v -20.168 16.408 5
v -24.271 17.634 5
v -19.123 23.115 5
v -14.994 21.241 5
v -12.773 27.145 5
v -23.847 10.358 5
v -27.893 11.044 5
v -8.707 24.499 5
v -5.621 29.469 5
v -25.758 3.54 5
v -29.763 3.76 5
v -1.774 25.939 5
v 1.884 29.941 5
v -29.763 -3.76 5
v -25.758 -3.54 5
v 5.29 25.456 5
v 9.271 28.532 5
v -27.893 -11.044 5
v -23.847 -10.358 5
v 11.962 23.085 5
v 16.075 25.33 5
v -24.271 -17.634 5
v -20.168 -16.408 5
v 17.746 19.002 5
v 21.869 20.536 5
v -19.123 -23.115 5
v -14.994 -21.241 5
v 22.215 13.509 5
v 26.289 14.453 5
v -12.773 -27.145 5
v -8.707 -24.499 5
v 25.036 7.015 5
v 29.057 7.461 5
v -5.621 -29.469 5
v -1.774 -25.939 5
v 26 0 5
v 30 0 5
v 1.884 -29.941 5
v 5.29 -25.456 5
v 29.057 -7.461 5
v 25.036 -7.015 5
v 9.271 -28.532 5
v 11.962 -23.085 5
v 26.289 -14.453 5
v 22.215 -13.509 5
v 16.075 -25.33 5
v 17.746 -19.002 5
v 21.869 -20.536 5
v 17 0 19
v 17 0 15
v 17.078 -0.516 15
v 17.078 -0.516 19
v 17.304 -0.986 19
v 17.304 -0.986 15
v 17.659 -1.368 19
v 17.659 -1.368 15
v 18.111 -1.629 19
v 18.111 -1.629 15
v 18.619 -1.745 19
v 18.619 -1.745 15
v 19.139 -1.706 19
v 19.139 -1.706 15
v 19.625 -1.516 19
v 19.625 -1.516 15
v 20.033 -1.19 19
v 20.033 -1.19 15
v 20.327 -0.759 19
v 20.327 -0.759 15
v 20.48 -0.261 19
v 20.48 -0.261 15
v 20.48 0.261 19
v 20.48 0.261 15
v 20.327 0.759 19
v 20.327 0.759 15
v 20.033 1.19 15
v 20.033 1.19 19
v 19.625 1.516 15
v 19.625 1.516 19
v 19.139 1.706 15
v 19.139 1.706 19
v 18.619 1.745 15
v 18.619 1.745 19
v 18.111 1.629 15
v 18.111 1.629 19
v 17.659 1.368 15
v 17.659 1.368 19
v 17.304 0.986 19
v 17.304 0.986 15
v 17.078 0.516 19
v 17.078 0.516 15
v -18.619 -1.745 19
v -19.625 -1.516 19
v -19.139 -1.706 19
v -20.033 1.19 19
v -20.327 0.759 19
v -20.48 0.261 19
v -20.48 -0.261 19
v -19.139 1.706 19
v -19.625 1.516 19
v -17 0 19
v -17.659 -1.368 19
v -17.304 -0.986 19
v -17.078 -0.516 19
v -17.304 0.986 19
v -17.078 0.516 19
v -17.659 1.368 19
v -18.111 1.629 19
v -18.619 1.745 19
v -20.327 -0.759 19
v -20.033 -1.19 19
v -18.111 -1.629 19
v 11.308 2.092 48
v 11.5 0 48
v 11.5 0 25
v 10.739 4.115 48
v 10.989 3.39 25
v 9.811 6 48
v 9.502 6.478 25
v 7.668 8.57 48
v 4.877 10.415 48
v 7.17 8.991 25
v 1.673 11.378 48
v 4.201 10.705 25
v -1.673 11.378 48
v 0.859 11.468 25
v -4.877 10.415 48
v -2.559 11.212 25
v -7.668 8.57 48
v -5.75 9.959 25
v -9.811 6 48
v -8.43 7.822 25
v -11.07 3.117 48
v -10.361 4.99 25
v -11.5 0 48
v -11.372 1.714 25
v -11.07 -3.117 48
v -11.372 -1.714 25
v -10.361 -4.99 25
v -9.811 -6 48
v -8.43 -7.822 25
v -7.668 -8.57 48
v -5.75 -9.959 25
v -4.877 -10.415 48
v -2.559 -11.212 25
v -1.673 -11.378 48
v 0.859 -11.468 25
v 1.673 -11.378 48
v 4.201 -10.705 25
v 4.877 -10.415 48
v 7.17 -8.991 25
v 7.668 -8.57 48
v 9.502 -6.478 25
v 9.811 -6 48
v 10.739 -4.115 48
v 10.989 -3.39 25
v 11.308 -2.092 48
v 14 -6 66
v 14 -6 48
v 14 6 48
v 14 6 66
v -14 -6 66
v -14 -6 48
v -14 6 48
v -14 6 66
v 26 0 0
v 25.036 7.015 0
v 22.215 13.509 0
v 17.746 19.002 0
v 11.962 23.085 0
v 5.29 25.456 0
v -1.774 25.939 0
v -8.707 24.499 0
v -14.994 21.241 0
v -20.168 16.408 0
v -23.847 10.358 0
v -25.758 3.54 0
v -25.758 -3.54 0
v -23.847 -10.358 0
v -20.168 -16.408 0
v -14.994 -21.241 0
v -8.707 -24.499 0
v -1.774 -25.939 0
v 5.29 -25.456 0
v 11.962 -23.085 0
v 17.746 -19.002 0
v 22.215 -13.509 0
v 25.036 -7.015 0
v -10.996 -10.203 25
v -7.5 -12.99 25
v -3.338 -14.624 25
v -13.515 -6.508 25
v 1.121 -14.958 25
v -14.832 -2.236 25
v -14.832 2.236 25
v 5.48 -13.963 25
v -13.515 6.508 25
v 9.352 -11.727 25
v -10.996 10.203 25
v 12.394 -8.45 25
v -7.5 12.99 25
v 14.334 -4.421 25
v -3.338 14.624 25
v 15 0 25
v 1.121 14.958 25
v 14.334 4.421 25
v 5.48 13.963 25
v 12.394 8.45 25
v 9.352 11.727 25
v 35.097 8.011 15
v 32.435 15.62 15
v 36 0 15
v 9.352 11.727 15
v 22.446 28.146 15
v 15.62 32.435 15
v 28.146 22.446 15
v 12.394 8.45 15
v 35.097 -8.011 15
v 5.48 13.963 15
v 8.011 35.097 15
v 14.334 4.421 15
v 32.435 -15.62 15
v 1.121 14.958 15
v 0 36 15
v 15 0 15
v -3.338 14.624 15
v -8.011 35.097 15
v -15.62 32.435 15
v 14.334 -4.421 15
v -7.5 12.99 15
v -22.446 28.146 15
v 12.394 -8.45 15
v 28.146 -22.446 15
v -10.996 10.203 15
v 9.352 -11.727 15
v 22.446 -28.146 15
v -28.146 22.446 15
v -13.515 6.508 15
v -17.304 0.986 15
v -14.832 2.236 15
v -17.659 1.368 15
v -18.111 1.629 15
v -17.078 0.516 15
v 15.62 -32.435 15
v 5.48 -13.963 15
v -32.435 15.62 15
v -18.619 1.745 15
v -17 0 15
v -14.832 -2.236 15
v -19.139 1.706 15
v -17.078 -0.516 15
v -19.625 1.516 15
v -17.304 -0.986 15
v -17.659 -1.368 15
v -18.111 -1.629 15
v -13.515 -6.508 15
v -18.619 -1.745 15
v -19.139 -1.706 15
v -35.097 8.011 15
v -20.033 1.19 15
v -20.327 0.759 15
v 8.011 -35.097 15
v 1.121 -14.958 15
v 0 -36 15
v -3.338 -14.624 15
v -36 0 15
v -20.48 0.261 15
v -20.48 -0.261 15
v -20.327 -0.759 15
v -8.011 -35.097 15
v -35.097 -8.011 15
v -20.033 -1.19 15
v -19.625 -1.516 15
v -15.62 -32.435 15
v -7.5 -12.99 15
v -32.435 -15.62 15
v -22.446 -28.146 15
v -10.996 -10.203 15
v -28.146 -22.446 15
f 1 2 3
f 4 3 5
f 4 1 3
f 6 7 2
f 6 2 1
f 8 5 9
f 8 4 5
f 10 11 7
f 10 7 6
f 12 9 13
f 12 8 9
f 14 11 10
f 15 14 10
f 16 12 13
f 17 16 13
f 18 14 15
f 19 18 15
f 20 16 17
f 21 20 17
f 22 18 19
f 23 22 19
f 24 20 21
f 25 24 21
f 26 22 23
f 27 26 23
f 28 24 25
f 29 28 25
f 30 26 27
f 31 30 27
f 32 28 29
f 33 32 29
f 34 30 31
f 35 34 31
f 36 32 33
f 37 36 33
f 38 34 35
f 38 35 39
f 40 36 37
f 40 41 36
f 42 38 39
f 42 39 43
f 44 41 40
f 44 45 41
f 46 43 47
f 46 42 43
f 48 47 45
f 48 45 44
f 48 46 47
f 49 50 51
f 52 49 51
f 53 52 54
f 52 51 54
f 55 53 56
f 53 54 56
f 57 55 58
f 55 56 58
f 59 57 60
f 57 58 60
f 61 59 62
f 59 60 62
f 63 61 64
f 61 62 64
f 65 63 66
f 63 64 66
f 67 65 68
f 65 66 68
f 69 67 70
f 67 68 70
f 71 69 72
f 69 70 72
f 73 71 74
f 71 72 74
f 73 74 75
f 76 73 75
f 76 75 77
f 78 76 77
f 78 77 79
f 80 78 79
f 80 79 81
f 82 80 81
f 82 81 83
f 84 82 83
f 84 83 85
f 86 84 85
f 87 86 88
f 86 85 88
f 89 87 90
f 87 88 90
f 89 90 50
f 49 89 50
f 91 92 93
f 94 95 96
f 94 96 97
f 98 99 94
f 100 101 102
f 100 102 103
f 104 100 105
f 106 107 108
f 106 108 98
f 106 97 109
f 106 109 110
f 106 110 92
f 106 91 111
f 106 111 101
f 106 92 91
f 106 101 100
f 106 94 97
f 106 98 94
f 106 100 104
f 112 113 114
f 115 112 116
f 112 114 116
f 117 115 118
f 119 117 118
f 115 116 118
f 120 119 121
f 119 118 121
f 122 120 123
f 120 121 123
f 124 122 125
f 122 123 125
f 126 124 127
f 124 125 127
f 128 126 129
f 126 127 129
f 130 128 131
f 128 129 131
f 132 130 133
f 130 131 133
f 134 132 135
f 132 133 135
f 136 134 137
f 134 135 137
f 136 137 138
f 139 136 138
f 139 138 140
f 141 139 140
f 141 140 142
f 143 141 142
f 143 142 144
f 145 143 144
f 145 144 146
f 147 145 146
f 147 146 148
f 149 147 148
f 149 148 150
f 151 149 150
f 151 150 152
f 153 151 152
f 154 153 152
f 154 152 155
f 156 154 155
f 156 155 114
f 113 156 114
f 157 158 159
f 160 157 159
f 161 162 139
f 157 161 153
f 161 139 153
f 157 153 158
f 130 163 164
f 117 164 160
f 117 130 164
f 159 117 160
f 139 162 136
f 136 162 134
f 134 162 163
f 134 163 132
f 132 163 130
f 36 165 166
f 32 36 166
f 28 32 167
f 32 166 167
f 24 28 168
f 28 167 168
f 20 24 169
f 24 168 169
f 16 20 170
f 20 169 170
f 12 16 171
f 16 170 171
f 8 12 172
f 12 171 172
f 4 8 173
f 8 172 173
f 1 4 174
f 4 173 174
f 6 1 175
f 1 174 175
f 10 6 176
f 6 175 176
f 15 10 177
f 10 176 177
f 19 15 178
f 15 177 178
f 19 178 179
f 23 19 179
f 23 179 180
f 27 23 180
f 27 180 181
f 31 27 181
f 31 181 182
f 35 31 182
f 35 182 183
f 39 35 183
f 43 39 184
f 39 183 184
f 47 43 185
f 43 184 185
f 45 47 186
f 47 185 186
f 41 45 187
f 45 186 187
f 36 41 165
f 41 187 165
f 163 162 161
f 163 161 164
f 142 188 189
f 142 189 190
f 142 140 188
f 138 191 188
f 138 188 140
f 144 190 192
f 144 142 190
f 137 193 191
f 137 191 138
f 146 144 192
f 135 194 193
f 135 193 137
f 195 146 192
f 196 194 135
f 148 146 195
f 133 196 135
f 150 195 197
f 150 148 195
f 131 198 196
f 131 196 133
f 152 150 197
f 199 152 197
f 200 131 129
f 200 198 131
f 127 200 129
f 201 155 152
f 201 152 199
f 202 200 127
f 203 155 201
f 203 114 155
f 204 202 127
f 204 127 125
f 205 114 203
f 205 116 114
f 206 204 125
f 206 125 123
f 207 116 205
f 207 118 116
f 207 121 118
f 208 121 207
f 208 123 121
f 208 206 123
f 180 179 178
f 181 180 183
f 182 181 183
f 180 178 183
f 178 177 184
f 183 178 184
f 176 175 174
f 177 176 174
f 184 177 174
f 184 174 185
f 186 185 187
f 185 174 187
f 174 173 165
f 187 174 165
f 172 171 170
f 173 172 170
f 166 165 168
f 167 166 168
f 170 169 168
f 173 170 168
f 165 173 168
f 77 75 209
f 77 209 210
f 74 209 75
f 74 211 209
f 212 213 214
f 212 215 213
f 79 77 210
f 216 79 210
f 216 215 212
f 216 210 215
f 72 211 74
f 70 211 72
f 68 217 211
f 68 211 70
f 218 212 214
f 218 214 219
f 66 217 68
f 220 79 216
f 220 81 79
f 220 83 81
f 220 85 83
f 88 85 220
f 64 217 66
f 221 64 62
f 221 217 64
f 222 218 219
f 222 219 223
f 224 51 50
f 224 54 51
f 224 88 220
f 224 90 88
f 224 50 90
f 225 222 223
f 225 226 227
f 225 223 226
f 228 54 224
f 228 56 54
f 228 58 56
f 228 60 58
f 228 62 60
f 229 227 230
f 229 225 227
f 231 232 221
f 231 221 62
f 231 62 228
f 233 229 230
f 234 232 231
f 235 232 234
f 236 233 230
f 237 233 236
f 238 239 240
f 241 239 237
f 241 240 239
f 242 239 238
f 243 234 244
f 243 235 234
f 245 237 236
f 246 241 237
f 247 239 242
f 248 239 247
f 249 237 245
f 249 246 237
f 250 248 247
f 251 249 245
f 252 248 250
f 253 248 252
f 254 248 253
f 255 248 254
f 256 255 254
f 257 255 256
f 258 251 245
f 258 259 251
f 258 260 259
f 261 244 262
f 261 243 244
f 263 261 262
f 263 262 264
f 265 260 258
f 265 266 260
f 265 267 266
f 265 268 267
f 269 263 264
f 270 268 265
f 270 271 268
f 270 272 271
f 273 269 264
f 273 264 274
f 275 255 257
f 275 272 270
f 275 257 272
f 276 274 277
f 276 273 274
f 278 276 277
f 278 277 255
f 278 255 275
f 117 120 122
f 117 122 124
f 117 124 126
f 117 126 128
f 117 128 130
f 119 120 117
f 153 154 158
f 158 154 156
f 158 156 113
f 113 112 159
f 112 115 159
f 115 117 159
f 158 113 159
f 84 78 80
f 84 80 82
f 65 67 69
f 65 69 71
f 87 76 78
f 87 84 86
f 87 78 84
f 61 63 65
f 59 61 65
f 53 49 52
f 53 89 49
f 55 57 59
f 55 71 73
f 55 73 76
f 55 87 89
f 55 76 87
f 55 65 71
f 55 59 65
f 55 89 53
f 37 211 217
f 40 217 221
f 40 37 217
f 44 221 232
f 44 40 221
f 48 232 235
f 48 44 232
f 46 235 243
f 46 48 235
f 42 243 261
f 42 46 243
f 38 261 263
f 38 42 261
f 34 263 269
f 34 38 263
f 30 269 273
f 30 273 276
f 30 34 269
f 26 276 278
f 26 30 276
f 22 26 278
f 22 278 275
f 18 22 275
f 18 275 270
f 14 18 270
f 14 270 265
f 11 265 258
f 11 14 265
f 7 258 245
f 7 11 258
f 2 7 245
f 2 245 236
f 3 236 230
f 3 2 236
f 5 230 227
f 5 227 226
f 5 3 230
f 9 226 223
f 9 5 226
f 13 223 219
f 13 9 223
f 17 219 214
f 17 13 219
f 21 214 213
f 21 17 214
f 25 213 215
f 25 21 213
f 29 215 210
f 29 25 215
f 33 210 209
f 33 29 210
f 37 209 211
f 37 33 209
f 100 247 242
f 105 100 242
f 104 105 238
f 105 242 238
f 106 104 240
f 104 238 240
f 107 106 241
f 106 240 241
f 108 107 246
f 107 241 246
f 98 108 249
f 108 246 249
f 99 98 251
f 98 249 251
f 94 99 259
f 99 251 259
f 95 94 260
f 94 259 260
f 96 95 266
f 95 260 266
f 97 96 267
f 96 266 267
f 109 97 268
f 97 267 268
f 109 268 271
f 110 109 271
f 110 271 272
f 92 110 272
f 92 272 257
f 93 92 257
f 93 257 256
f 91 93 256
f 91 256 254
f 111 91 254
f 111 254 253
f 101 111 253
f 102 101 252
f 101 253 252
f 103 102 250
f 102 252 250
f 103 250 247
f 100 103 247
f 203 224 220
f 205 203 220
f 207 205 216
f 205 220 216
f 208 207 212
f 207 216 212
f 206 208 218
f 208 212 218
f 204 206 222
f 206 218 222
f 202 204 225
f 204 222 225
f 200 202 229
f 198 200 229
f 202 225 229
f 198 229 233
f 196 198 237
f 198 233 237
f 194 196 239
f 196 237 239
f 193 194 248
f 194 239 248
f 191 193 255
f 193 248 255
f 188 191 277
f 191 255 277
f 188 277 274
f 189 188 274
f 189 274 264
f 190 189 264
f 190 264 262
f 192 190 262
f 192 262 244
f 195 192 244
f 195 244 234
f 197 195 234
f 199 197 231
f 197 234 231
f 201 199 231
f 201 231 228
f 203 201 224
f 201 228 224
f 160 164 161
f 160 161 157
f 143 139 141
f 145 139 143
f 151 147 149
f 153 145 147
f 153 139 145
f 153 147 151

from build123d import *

# Parameters (mm, degrees)
SKETCH1_R           = 26
BOSS_EXTRUDE1_DEPTH = 15
SKETCH3_R           = 15
BOSS_EXTRUDE2_DEPTH = 10
SKETCH4_R           = 11.5
BOSS_EXTRUDE3_DEPTH = 23
SKETCH5_W           = 28
SKETCH5_H           = 12
BOSS_EXTRUDE4_DEPTH = 18
SKETCH6_R           = 1.75
BOSS_EXTRUDE5_DEPTH = 4


with BuildPart() as part:
    # Sketch1 → Boss-Extrude1 (new body)
    with BuildSketch(Plane.XY):
        Circle(SKETCH1_R)
    extrude(amount=BOSS_EXTRUDE1_DEPTH)

    # Sketch2 → Revolve1 (revolve)
    with BuildSketch(Plane(origin=(0, 0, 0), x_dir=(1, 0, 0), z_dir=(0, 1, 0))):
        Polygon((26, -15), (36, -15), (30, -5), (26, -5), align=None)
    revolve(axis=Axis((0, 0, 15), (0, 0, -1)))

    # Sketch3 → Boss-Extrude2 (add)
    with BuildSketch(Plane.XY.offset(15)):
        Circle(SKETCH3_R)
    extrude(amount=BOSS_EXTRUDE2_DEPTH)

    # Sketch4 → Boss-Extrude3 (add)
    with BuildSketch(Plane.XY.offset(25)):
        Circle(SKETCH4_R)
    extrude(amount=BOSS_EXTRUDE3_DEPTH)

    # Sketch5 → Boss-Extrude4 (add)
    with BuildSketch(Plane.XY.offset(48)):
        Rectangle(SKETCH5_W, SKETCH5_H)
    extrude(amount=BOSS_EXTRUDE4_DEPTH)

    # Sketch6 → Boss-Extrude5 (add)
    with BuildSketch(Plane.XY.offset(15)):
        with Locations((-18.75, 0)):
            Circle(SKETCH6_R)
        with Locations(Location((18.75, 0, 0), (0, 0, 180))):
            Circle(SKETCH6_R)
    extrude(amount=BOSS_EXTRUDE5_DEPTH)


solid = part.part
